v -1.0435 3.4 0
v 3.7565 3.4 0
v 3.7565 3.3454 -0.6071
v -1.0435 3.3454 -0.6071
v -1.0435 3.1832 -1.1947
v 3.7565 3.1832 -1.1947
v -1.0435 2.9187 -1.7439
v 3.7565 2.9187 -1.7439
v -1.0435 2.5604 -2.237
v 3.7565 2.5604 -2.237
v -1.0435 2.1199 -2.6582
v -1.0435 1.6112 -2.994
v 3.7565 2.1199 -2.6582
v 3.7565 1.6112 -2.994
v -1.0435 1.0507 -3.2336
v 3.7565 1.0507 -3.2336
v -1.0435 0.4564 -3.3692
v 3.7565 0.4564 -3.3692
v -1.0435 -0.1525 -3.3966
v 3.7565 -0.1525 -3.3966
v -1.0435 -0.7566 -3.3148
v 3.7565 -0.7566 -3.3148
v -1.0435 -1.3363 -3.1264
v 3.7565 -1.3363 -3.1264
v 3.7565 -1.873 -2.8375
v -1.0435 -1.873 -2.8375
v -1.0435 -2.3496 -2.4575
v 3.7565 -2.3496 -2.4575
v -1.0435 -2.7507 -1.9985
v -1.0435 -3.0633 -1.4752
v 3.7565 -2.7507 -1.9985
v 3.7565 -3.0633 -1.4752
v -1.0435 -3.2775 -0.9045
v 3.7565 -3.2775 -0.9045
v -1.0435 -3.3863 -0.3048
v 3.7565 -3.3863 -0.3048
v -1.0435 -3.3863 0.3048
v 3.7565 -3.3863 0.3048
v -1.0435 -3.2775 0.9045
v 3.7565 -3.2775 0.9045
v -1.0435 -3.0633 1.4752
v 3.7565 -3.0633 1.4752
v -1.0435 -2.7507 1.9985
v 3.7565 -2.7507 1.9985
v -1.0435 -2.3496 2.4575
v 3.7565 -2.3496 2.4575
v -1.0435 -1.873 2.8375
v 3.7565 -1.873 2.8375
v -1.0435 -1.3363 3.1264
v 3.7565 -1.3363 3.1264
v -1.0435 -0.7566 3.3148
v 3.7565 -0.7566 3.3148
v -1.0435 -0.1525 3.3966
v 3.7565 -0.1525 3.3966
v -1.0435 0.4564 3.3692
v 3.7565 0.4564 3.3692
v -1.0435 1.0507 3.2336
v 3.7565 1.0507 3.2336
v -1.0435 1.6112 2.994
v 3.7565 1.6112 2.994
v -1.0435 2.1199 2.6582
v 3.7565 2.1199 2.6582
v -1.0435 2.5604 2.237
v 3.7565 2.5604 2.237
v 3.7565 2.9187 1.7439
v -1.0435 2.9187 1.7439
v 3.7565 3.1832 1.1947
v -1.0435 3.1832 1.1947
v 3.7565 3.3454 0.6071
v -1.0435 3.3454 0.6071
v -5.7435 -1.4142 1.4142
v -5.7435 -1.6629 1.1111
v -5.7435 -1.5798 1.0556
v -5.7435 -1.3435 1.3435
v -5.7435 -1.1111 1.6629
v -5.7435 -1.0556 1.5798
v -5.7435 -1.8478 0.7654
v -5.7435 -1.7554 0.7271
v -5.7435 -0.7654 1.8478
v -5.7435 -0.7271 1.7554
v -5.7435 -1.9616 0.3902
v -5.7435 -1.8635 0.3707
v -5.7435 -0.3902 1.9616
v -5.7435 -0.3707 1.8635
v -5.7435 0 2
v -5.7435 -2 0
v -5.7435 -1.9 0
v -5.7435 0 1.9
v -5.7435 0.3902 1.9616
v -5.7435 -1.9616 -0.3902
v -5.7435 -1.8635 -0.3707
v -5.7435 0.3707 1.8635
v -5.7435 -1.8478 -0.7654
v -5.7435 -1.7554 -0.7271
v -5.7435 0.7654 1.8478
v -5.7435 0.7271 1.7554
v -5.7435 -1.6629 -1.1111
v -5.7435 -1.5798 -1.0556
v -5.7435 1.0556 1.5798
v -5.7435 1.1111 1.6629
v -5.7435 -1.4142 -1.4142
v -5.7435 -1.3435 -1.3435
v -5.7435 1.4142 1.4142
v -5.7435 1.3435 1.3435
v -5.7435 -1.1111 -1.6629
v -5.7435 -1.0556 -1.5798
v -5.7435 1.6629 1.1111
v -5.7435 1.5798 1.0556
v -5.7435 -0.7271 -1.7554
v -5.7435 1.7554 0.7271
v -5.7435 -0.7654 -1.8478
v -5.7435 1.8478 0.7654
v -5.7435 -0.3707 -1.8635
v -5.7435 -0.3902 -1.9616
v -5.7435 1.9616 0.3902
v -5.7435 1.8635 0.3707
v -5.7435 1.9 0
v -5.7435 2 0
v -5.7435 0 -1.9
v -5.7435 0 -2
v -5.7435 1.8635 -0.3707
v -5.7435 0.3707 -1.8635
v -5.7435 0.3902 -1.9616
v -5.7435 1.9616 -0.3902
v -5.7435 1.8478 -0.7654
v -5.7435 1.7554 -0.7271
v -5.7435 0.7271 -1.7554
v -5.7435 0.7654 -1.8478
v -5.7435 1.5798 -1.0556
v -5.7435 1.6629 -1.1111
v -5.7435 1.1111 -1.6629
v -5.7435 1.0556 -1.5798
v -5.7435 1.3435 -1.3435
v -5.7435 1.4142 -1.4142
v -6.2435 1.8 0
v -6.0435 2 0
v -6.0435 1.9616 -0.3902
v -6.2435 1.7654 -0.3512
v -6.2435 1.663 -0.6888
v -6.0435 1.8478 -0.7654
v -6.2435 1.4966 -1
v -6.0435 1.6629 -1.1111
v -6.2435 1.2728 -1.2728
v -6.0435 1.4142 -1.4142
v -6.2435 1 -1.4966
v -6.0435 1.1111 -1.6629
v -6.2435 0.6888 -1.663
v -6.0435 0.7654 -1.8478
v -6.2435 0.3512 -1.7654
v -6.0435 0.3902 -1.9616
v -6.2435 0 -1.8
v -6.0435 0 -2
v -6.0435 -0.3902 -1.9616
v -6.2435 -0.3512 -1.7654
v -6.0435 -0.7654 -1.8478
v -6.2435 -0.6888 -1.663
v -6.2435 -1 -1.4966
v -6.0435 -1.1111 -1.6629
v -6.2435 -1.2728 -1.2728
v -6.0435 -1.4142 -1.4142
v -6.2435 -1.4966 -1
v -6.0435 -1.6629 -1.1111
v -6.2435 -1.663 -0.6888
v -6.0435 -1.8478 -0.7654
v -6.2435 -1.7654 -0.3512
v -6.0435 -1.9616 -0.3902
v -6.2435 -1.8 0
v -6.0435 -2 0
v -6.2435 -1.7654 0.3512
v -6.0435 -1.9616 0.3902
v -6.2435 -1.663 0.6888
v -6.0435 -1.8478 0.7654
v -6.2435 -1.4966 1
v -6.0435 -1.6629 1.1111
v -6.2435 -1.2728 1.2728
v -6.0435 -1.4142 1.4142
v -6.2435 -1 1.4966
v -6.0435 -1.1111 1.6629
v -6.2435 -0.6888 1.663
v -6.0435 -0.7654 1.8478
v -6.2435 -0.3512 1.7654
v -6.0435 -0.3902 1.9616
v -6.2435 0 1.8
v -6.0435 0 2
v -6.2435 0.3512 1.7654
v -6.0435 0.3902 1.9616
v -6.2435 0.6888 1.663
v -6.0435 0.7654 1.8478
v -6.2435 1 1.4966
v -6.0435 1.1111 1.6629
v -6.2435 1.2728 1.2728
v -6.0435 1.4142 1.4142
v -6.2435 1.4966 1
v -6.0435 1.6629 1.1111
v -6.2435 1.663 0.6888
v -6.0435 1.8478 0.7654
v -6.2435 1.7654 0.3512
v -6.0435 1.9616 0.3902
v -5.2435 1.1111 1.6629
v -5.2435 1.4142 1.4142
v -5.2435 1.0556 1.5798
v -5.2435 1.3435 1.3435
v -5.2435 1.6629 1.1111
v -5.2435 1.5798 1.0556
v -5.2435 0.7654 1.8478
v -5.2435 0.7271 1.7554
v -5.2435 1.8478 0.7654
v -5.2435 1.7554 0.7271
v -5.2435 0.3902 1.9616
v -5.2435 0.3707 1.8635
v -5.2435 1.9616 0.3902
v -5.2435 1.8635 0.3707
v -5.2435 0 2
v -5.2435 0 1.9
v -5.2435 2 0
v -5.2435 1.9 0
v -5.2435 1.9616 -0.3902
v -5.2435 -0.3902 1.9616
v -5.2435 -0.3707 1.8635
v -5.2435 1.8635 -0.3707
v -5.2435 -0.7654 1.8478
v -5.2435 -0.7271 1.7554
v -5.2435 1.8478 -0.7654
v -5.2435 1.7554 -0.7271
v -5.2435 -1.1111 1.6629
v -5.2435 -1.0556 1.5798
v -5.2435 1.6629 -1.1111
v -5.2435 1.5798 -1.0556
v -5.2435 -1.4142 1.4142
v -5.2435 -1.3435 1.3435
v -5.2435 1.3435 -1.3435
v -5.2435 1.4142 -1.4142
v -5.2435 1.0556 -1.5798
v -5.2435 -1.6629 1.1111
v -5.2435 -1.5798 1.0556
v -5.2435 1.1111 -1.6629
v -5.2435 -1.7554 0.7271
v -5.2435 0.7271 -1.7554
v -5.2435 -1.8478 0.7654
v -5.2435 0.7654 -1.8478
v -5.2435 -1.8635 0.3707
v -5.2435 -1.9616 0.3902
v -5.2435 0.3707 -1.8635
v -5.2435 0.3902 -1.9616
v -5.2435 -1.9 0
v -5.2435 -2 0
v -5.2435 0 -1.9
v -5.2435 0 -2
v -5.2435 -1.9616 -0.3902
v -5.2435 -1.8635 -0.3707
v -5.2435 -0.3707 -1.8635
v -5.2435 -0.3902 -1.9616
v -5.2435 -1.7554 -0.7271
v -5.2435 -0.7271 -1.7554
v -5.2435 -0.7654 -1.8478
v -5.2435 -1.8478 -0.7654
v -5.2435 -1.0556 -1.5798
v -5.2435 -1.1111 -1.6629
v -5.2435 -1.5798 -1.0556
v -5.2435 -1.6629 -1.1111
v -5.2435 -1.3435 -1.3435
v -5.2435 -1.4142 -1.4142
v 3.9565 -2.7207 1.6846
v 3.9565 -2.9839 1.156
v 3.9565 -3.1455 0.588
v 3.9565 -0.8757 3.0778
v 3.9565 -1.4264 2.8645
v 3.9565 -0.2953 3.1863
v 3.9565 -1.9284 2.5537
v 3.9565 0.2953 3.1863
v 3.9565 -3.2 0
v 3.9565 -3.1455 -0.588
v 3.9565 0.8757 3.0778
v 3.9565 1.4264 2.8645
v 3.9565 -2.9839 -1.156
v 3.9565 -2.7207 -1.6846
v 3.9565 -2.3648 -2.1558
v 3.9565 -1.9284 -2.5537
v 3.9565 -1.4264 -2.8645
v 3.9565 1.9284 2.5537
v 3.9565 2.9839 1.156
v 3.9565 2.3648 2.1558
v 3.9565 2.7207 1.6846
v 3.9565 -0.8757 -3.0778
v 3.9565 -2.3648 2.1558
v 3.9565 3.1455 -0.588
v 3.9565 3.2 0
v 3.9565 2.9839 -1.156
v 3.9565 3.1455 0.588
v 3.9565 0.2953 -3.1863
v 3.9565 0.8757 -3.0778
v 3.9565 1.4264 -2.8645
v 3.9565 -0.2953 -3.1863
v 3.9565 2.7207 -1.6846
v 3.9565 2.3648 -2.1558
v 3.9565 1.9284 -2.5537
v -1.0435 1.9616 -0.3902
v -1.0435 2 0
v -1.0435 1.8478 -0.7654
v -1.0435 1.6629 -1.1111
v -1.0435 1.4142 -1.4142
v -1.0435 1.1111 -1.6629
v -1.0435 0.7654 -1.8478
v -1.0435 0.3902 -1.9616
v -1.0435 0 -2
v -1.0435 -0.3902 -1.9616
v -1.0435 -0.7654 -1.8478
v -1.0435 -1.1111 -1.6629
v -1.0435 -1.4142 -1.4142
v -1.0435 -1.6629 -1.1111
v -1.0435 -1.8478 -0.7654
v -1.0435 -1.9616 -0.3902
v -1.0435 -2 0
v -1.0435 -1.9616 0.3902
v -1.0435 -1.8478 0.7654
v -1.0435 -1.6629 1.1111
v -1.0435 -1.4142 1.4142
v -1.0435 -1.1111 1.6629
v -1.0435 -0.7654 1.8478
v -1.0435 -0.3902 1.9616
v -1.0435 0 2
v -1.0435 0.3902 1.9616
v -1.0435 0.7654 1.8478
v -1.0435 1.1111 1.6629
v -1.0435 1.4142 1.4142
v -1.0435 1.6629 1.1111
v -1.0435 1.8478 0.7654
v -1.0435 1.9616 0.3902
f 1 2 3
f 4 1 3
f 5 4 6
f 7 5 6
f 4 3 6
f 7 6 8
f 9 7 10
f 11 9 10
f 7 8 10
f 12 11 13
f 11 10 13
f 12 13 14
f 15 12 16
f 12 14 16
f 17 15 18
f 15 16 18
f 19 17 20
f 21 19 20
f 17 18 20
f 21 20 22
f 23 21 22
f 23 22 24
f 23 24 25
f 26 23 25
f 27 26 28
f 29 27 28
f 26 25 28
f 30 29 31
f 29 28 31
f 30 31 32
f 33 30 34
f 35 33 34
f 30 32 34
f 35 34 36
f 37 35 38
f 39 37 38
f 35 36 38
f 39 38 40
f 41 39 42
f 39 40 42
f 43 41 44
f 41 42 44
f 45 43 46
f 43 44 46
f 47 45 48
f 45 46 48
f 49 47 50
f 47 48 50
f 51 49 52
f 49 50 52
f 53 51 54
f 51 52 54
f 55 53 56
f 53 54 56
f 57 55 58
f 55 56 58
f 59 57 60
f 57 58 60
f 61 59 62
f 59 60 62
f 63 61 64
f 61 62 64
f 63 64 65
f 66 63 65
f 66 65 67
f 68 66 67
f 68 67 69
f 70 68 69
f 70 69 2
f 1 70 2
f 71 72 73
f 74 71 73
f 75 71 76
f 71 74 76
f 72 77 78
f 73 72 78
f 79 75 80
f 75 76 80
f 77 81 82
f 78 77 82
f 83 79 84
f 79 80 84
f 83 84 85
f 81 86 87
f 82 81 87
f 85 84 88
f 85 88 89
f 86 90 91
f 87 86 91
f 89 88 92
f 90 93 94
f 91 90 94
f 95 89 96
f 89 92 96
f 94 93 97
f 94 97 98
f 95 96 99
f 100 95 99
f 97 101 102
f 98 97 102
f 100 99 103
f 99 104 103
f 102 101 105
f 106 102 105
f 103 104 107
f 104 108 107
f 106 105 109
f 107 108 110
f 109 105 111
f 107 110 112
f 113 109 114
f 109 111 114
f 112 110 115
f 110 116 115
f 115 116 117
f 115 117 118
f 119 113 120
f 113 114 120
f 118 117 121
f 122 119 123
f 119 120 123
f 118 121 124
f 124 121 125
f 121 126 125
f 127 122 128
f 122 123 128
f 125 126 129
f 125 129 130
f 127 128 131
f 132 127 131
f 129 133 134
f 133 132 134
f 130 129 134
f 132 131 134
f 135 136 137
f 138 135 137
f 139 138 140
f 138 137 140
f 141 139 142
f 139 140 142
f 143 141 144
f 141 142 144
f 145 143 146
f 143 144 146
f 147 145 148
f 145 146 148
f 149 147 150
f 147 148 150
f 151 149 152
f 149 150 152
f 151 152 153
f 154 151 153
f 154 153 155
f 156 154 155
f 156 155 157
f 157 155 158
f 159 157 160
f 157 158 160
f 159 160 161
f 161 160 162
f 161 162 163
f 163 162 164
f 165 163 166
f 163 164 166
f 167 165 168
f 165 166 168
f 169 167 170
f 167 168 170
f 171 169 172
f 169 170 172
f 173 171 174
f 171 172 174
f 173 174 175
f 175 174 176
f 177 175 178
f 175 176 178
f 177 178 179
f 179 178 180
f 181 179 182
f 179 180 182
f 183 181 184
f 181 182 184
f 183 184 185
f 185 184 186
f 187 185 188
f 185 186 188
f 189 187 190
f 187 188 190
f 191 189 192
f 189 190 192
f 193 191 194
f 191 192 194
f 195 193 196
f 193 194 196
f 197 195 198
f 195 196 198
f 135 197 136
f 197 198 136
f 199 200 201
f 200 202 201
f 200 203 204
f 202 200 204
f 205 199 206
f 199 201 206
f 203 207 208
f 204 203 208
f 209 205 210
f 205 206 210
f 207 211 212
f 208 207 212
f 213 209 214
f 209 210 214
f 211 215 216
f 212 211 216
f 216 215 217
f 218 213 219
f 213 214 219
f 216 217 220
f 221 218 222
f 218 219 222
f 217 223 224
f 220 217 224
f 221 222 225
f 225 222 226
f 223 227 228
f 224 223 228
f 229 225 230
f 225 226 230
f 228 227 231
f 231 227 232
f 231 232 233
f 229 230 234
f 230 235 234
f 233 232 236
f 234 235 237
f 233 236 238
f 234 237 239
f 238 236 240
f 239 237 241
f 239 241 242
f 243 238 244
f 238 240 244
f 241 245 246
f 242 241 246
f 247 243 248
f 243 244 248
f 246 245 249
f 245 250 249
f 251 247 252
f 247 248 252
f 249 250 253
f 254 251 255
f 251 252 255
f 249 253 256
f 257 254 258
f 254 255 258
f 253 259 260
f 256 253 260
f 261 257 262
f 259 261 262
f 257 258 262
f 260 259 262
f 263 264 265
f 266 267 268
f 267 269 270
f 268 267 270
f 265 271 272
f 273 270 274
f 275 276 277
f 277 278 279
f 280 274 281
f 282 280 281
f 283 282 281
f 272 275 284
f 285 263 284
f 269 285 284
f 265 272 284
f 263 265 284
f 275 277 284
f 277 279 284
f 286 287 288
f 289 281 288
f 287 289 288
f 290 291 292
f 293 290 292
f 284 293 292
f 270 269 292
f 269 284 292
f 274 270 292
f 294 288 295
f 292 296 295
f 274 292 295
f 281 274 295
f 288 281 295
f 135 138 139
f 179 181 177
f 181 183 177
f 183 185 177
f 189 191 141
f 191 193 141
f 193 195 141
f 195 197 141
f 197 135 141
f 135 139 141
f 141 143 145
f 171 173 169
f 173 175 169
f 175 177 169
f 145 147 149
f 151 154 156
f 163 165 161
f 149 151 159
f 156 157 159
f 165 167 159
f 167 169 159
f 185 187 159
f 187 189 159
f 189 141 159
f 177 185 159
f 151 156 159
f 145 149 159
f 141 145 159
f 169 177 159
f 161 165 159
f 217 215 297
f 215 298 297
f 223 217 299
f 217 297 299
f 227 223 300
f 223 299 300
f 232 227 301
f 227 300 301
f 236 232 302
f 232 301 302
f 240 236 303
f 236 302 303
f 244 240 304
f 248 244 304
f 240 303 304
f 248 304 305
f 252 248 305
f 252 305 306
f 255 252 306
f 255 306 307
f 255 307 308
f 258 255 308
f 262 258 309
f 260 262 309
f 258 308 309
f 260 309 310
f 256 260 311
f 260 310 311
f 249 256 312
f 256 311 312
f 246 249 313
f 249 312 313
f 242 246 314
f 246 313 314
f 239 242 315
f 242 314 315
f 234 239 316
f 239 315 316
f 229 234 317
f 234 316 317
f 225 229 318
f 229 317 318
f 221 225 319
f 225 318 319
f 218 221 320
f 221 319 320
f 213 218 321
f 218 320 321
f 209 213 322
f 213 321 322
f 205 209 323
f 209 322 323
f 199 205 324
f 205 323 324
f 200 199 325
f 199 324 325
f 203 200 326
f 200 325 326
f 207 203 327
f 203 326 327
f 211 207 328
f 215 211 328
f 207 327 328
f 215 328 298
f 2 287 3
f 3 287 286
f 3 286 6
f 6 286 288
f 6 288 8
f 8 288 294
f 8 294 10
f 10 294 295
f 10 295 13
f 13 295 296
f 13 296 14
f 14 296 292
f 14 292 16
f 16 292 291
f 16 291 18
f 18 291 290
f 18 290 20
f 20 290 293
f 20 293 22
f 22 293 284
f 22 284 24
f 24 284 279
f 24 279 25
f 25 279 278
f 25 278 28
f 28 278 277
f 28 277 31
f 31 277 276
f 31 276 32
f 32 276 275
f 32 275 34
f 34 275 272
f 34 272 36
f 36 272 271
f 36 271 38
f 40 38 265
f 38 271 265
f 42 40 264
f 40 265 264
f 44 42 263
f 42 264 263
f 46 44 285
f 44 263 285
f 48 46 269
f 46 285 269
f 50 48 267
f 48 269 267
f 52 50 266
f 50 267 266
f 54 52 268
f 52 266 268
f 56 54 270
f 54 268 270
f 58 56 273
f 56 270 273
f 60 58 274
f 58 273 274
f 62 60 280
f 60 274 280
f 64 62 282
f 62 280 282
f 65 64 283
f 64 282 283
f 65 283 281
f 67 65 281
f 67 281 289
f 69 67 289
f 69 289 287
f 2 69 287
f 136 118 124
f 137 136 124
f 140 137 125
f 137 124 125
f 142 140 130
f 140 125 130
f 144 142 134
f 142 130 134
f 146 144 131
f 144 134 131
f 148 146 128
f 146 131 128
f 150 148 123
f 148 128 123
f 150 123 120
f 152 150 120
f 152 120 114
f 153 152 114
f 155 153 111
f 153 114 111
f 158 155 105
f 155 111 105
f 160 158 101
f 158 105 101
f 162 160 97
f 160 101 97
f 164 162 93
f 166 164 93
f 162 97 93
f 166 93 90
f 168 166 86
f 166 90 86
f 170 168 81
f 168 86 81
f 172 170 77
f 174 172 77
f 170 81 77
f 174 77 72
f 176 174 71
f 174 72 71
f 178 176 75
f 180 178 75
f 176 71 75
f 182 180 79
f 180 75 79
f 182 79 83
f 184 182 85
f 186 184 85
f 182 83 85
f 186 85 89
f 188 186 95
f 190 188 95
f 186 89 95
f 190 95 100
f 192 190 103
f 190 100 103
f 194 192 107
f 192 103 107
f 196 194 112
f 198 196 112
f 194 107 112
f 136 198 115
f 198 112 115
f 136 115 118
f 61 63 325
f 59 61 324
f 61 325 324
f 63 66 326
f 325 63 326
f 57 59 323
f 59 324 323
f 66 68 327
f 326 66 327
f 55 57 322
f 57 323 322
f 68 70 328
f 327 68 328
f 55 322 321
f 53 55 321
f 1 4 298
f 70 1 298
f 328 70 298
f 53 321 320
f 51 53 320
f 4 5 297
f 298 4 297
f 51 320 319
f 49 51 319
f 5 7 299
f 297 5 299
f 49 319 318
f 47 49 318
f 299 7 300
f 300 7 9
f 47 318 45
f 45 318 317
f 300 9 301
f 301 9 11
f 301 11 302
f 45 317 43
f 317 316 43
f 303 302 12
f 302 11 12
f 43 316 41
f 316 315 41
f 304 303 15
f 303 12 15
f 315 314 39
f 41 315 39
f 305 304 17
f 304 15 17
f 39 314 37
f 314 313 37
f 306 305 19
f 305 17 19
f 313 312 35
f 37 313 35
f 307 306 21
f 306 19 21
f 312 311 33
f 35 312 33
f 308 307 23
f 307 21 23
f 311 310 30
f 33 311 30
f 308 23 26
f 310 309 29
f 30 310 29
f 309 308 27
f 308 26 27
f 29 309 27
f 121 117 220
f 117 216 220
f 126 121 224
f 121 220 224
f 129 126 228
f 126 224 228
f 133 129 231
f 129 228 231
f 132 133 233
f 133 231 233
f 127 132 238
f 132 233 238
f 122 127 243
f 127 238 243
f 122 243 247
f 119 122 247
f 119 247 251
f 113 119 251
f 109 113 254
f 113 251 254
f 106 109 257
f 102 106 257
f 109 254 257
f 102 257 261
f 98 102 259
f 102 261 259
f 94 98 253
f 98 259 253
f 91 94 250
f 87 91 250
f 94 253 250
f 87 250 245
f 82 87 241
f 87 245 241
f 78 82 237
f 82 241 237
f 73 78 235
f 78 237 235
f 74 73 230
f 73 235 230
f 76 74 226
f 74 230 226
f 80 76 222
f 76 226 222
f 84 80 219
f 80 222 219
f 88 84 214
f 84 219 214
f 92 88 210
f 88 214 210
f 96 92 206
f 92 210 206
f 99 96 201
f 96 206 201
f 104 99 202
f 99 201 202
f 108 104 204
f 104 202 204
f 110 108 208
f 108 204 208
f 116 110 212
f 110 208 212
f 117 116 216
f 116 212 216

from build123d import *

# Parameters (mm, degrees)
FASE1_SIZE = 0.2


with BuildPart() as part:
    # Skizze2 → Rotation1 (revolve)
    with BuildSketch(Plane.XY):
        Polygon((3.956451613, 0), (-6.243548387, 0), (-6.243548387, 2), (-5.743548387, 2), (-5.743548387, 1.9), (-5.243548387, 1.9), (-5.243548387, 2), (-1.043548387, 2), (-1.043548387, 3.4), (3.956451613, 3.4), align=None)
    revolve(axis=Axis((3.956451613, 0, 0), (-1, 0, 0)))

    # Fase1
    fase1_edges = [part.edges().sort_by_distance(p)[0] for p in [
        (-6.243548387, -2, 0),
        (3.956451613, -3.4, 0),
    ]]
    chamfer(fase1_edges, length=FASE1_SIZE)


solid = part.part
